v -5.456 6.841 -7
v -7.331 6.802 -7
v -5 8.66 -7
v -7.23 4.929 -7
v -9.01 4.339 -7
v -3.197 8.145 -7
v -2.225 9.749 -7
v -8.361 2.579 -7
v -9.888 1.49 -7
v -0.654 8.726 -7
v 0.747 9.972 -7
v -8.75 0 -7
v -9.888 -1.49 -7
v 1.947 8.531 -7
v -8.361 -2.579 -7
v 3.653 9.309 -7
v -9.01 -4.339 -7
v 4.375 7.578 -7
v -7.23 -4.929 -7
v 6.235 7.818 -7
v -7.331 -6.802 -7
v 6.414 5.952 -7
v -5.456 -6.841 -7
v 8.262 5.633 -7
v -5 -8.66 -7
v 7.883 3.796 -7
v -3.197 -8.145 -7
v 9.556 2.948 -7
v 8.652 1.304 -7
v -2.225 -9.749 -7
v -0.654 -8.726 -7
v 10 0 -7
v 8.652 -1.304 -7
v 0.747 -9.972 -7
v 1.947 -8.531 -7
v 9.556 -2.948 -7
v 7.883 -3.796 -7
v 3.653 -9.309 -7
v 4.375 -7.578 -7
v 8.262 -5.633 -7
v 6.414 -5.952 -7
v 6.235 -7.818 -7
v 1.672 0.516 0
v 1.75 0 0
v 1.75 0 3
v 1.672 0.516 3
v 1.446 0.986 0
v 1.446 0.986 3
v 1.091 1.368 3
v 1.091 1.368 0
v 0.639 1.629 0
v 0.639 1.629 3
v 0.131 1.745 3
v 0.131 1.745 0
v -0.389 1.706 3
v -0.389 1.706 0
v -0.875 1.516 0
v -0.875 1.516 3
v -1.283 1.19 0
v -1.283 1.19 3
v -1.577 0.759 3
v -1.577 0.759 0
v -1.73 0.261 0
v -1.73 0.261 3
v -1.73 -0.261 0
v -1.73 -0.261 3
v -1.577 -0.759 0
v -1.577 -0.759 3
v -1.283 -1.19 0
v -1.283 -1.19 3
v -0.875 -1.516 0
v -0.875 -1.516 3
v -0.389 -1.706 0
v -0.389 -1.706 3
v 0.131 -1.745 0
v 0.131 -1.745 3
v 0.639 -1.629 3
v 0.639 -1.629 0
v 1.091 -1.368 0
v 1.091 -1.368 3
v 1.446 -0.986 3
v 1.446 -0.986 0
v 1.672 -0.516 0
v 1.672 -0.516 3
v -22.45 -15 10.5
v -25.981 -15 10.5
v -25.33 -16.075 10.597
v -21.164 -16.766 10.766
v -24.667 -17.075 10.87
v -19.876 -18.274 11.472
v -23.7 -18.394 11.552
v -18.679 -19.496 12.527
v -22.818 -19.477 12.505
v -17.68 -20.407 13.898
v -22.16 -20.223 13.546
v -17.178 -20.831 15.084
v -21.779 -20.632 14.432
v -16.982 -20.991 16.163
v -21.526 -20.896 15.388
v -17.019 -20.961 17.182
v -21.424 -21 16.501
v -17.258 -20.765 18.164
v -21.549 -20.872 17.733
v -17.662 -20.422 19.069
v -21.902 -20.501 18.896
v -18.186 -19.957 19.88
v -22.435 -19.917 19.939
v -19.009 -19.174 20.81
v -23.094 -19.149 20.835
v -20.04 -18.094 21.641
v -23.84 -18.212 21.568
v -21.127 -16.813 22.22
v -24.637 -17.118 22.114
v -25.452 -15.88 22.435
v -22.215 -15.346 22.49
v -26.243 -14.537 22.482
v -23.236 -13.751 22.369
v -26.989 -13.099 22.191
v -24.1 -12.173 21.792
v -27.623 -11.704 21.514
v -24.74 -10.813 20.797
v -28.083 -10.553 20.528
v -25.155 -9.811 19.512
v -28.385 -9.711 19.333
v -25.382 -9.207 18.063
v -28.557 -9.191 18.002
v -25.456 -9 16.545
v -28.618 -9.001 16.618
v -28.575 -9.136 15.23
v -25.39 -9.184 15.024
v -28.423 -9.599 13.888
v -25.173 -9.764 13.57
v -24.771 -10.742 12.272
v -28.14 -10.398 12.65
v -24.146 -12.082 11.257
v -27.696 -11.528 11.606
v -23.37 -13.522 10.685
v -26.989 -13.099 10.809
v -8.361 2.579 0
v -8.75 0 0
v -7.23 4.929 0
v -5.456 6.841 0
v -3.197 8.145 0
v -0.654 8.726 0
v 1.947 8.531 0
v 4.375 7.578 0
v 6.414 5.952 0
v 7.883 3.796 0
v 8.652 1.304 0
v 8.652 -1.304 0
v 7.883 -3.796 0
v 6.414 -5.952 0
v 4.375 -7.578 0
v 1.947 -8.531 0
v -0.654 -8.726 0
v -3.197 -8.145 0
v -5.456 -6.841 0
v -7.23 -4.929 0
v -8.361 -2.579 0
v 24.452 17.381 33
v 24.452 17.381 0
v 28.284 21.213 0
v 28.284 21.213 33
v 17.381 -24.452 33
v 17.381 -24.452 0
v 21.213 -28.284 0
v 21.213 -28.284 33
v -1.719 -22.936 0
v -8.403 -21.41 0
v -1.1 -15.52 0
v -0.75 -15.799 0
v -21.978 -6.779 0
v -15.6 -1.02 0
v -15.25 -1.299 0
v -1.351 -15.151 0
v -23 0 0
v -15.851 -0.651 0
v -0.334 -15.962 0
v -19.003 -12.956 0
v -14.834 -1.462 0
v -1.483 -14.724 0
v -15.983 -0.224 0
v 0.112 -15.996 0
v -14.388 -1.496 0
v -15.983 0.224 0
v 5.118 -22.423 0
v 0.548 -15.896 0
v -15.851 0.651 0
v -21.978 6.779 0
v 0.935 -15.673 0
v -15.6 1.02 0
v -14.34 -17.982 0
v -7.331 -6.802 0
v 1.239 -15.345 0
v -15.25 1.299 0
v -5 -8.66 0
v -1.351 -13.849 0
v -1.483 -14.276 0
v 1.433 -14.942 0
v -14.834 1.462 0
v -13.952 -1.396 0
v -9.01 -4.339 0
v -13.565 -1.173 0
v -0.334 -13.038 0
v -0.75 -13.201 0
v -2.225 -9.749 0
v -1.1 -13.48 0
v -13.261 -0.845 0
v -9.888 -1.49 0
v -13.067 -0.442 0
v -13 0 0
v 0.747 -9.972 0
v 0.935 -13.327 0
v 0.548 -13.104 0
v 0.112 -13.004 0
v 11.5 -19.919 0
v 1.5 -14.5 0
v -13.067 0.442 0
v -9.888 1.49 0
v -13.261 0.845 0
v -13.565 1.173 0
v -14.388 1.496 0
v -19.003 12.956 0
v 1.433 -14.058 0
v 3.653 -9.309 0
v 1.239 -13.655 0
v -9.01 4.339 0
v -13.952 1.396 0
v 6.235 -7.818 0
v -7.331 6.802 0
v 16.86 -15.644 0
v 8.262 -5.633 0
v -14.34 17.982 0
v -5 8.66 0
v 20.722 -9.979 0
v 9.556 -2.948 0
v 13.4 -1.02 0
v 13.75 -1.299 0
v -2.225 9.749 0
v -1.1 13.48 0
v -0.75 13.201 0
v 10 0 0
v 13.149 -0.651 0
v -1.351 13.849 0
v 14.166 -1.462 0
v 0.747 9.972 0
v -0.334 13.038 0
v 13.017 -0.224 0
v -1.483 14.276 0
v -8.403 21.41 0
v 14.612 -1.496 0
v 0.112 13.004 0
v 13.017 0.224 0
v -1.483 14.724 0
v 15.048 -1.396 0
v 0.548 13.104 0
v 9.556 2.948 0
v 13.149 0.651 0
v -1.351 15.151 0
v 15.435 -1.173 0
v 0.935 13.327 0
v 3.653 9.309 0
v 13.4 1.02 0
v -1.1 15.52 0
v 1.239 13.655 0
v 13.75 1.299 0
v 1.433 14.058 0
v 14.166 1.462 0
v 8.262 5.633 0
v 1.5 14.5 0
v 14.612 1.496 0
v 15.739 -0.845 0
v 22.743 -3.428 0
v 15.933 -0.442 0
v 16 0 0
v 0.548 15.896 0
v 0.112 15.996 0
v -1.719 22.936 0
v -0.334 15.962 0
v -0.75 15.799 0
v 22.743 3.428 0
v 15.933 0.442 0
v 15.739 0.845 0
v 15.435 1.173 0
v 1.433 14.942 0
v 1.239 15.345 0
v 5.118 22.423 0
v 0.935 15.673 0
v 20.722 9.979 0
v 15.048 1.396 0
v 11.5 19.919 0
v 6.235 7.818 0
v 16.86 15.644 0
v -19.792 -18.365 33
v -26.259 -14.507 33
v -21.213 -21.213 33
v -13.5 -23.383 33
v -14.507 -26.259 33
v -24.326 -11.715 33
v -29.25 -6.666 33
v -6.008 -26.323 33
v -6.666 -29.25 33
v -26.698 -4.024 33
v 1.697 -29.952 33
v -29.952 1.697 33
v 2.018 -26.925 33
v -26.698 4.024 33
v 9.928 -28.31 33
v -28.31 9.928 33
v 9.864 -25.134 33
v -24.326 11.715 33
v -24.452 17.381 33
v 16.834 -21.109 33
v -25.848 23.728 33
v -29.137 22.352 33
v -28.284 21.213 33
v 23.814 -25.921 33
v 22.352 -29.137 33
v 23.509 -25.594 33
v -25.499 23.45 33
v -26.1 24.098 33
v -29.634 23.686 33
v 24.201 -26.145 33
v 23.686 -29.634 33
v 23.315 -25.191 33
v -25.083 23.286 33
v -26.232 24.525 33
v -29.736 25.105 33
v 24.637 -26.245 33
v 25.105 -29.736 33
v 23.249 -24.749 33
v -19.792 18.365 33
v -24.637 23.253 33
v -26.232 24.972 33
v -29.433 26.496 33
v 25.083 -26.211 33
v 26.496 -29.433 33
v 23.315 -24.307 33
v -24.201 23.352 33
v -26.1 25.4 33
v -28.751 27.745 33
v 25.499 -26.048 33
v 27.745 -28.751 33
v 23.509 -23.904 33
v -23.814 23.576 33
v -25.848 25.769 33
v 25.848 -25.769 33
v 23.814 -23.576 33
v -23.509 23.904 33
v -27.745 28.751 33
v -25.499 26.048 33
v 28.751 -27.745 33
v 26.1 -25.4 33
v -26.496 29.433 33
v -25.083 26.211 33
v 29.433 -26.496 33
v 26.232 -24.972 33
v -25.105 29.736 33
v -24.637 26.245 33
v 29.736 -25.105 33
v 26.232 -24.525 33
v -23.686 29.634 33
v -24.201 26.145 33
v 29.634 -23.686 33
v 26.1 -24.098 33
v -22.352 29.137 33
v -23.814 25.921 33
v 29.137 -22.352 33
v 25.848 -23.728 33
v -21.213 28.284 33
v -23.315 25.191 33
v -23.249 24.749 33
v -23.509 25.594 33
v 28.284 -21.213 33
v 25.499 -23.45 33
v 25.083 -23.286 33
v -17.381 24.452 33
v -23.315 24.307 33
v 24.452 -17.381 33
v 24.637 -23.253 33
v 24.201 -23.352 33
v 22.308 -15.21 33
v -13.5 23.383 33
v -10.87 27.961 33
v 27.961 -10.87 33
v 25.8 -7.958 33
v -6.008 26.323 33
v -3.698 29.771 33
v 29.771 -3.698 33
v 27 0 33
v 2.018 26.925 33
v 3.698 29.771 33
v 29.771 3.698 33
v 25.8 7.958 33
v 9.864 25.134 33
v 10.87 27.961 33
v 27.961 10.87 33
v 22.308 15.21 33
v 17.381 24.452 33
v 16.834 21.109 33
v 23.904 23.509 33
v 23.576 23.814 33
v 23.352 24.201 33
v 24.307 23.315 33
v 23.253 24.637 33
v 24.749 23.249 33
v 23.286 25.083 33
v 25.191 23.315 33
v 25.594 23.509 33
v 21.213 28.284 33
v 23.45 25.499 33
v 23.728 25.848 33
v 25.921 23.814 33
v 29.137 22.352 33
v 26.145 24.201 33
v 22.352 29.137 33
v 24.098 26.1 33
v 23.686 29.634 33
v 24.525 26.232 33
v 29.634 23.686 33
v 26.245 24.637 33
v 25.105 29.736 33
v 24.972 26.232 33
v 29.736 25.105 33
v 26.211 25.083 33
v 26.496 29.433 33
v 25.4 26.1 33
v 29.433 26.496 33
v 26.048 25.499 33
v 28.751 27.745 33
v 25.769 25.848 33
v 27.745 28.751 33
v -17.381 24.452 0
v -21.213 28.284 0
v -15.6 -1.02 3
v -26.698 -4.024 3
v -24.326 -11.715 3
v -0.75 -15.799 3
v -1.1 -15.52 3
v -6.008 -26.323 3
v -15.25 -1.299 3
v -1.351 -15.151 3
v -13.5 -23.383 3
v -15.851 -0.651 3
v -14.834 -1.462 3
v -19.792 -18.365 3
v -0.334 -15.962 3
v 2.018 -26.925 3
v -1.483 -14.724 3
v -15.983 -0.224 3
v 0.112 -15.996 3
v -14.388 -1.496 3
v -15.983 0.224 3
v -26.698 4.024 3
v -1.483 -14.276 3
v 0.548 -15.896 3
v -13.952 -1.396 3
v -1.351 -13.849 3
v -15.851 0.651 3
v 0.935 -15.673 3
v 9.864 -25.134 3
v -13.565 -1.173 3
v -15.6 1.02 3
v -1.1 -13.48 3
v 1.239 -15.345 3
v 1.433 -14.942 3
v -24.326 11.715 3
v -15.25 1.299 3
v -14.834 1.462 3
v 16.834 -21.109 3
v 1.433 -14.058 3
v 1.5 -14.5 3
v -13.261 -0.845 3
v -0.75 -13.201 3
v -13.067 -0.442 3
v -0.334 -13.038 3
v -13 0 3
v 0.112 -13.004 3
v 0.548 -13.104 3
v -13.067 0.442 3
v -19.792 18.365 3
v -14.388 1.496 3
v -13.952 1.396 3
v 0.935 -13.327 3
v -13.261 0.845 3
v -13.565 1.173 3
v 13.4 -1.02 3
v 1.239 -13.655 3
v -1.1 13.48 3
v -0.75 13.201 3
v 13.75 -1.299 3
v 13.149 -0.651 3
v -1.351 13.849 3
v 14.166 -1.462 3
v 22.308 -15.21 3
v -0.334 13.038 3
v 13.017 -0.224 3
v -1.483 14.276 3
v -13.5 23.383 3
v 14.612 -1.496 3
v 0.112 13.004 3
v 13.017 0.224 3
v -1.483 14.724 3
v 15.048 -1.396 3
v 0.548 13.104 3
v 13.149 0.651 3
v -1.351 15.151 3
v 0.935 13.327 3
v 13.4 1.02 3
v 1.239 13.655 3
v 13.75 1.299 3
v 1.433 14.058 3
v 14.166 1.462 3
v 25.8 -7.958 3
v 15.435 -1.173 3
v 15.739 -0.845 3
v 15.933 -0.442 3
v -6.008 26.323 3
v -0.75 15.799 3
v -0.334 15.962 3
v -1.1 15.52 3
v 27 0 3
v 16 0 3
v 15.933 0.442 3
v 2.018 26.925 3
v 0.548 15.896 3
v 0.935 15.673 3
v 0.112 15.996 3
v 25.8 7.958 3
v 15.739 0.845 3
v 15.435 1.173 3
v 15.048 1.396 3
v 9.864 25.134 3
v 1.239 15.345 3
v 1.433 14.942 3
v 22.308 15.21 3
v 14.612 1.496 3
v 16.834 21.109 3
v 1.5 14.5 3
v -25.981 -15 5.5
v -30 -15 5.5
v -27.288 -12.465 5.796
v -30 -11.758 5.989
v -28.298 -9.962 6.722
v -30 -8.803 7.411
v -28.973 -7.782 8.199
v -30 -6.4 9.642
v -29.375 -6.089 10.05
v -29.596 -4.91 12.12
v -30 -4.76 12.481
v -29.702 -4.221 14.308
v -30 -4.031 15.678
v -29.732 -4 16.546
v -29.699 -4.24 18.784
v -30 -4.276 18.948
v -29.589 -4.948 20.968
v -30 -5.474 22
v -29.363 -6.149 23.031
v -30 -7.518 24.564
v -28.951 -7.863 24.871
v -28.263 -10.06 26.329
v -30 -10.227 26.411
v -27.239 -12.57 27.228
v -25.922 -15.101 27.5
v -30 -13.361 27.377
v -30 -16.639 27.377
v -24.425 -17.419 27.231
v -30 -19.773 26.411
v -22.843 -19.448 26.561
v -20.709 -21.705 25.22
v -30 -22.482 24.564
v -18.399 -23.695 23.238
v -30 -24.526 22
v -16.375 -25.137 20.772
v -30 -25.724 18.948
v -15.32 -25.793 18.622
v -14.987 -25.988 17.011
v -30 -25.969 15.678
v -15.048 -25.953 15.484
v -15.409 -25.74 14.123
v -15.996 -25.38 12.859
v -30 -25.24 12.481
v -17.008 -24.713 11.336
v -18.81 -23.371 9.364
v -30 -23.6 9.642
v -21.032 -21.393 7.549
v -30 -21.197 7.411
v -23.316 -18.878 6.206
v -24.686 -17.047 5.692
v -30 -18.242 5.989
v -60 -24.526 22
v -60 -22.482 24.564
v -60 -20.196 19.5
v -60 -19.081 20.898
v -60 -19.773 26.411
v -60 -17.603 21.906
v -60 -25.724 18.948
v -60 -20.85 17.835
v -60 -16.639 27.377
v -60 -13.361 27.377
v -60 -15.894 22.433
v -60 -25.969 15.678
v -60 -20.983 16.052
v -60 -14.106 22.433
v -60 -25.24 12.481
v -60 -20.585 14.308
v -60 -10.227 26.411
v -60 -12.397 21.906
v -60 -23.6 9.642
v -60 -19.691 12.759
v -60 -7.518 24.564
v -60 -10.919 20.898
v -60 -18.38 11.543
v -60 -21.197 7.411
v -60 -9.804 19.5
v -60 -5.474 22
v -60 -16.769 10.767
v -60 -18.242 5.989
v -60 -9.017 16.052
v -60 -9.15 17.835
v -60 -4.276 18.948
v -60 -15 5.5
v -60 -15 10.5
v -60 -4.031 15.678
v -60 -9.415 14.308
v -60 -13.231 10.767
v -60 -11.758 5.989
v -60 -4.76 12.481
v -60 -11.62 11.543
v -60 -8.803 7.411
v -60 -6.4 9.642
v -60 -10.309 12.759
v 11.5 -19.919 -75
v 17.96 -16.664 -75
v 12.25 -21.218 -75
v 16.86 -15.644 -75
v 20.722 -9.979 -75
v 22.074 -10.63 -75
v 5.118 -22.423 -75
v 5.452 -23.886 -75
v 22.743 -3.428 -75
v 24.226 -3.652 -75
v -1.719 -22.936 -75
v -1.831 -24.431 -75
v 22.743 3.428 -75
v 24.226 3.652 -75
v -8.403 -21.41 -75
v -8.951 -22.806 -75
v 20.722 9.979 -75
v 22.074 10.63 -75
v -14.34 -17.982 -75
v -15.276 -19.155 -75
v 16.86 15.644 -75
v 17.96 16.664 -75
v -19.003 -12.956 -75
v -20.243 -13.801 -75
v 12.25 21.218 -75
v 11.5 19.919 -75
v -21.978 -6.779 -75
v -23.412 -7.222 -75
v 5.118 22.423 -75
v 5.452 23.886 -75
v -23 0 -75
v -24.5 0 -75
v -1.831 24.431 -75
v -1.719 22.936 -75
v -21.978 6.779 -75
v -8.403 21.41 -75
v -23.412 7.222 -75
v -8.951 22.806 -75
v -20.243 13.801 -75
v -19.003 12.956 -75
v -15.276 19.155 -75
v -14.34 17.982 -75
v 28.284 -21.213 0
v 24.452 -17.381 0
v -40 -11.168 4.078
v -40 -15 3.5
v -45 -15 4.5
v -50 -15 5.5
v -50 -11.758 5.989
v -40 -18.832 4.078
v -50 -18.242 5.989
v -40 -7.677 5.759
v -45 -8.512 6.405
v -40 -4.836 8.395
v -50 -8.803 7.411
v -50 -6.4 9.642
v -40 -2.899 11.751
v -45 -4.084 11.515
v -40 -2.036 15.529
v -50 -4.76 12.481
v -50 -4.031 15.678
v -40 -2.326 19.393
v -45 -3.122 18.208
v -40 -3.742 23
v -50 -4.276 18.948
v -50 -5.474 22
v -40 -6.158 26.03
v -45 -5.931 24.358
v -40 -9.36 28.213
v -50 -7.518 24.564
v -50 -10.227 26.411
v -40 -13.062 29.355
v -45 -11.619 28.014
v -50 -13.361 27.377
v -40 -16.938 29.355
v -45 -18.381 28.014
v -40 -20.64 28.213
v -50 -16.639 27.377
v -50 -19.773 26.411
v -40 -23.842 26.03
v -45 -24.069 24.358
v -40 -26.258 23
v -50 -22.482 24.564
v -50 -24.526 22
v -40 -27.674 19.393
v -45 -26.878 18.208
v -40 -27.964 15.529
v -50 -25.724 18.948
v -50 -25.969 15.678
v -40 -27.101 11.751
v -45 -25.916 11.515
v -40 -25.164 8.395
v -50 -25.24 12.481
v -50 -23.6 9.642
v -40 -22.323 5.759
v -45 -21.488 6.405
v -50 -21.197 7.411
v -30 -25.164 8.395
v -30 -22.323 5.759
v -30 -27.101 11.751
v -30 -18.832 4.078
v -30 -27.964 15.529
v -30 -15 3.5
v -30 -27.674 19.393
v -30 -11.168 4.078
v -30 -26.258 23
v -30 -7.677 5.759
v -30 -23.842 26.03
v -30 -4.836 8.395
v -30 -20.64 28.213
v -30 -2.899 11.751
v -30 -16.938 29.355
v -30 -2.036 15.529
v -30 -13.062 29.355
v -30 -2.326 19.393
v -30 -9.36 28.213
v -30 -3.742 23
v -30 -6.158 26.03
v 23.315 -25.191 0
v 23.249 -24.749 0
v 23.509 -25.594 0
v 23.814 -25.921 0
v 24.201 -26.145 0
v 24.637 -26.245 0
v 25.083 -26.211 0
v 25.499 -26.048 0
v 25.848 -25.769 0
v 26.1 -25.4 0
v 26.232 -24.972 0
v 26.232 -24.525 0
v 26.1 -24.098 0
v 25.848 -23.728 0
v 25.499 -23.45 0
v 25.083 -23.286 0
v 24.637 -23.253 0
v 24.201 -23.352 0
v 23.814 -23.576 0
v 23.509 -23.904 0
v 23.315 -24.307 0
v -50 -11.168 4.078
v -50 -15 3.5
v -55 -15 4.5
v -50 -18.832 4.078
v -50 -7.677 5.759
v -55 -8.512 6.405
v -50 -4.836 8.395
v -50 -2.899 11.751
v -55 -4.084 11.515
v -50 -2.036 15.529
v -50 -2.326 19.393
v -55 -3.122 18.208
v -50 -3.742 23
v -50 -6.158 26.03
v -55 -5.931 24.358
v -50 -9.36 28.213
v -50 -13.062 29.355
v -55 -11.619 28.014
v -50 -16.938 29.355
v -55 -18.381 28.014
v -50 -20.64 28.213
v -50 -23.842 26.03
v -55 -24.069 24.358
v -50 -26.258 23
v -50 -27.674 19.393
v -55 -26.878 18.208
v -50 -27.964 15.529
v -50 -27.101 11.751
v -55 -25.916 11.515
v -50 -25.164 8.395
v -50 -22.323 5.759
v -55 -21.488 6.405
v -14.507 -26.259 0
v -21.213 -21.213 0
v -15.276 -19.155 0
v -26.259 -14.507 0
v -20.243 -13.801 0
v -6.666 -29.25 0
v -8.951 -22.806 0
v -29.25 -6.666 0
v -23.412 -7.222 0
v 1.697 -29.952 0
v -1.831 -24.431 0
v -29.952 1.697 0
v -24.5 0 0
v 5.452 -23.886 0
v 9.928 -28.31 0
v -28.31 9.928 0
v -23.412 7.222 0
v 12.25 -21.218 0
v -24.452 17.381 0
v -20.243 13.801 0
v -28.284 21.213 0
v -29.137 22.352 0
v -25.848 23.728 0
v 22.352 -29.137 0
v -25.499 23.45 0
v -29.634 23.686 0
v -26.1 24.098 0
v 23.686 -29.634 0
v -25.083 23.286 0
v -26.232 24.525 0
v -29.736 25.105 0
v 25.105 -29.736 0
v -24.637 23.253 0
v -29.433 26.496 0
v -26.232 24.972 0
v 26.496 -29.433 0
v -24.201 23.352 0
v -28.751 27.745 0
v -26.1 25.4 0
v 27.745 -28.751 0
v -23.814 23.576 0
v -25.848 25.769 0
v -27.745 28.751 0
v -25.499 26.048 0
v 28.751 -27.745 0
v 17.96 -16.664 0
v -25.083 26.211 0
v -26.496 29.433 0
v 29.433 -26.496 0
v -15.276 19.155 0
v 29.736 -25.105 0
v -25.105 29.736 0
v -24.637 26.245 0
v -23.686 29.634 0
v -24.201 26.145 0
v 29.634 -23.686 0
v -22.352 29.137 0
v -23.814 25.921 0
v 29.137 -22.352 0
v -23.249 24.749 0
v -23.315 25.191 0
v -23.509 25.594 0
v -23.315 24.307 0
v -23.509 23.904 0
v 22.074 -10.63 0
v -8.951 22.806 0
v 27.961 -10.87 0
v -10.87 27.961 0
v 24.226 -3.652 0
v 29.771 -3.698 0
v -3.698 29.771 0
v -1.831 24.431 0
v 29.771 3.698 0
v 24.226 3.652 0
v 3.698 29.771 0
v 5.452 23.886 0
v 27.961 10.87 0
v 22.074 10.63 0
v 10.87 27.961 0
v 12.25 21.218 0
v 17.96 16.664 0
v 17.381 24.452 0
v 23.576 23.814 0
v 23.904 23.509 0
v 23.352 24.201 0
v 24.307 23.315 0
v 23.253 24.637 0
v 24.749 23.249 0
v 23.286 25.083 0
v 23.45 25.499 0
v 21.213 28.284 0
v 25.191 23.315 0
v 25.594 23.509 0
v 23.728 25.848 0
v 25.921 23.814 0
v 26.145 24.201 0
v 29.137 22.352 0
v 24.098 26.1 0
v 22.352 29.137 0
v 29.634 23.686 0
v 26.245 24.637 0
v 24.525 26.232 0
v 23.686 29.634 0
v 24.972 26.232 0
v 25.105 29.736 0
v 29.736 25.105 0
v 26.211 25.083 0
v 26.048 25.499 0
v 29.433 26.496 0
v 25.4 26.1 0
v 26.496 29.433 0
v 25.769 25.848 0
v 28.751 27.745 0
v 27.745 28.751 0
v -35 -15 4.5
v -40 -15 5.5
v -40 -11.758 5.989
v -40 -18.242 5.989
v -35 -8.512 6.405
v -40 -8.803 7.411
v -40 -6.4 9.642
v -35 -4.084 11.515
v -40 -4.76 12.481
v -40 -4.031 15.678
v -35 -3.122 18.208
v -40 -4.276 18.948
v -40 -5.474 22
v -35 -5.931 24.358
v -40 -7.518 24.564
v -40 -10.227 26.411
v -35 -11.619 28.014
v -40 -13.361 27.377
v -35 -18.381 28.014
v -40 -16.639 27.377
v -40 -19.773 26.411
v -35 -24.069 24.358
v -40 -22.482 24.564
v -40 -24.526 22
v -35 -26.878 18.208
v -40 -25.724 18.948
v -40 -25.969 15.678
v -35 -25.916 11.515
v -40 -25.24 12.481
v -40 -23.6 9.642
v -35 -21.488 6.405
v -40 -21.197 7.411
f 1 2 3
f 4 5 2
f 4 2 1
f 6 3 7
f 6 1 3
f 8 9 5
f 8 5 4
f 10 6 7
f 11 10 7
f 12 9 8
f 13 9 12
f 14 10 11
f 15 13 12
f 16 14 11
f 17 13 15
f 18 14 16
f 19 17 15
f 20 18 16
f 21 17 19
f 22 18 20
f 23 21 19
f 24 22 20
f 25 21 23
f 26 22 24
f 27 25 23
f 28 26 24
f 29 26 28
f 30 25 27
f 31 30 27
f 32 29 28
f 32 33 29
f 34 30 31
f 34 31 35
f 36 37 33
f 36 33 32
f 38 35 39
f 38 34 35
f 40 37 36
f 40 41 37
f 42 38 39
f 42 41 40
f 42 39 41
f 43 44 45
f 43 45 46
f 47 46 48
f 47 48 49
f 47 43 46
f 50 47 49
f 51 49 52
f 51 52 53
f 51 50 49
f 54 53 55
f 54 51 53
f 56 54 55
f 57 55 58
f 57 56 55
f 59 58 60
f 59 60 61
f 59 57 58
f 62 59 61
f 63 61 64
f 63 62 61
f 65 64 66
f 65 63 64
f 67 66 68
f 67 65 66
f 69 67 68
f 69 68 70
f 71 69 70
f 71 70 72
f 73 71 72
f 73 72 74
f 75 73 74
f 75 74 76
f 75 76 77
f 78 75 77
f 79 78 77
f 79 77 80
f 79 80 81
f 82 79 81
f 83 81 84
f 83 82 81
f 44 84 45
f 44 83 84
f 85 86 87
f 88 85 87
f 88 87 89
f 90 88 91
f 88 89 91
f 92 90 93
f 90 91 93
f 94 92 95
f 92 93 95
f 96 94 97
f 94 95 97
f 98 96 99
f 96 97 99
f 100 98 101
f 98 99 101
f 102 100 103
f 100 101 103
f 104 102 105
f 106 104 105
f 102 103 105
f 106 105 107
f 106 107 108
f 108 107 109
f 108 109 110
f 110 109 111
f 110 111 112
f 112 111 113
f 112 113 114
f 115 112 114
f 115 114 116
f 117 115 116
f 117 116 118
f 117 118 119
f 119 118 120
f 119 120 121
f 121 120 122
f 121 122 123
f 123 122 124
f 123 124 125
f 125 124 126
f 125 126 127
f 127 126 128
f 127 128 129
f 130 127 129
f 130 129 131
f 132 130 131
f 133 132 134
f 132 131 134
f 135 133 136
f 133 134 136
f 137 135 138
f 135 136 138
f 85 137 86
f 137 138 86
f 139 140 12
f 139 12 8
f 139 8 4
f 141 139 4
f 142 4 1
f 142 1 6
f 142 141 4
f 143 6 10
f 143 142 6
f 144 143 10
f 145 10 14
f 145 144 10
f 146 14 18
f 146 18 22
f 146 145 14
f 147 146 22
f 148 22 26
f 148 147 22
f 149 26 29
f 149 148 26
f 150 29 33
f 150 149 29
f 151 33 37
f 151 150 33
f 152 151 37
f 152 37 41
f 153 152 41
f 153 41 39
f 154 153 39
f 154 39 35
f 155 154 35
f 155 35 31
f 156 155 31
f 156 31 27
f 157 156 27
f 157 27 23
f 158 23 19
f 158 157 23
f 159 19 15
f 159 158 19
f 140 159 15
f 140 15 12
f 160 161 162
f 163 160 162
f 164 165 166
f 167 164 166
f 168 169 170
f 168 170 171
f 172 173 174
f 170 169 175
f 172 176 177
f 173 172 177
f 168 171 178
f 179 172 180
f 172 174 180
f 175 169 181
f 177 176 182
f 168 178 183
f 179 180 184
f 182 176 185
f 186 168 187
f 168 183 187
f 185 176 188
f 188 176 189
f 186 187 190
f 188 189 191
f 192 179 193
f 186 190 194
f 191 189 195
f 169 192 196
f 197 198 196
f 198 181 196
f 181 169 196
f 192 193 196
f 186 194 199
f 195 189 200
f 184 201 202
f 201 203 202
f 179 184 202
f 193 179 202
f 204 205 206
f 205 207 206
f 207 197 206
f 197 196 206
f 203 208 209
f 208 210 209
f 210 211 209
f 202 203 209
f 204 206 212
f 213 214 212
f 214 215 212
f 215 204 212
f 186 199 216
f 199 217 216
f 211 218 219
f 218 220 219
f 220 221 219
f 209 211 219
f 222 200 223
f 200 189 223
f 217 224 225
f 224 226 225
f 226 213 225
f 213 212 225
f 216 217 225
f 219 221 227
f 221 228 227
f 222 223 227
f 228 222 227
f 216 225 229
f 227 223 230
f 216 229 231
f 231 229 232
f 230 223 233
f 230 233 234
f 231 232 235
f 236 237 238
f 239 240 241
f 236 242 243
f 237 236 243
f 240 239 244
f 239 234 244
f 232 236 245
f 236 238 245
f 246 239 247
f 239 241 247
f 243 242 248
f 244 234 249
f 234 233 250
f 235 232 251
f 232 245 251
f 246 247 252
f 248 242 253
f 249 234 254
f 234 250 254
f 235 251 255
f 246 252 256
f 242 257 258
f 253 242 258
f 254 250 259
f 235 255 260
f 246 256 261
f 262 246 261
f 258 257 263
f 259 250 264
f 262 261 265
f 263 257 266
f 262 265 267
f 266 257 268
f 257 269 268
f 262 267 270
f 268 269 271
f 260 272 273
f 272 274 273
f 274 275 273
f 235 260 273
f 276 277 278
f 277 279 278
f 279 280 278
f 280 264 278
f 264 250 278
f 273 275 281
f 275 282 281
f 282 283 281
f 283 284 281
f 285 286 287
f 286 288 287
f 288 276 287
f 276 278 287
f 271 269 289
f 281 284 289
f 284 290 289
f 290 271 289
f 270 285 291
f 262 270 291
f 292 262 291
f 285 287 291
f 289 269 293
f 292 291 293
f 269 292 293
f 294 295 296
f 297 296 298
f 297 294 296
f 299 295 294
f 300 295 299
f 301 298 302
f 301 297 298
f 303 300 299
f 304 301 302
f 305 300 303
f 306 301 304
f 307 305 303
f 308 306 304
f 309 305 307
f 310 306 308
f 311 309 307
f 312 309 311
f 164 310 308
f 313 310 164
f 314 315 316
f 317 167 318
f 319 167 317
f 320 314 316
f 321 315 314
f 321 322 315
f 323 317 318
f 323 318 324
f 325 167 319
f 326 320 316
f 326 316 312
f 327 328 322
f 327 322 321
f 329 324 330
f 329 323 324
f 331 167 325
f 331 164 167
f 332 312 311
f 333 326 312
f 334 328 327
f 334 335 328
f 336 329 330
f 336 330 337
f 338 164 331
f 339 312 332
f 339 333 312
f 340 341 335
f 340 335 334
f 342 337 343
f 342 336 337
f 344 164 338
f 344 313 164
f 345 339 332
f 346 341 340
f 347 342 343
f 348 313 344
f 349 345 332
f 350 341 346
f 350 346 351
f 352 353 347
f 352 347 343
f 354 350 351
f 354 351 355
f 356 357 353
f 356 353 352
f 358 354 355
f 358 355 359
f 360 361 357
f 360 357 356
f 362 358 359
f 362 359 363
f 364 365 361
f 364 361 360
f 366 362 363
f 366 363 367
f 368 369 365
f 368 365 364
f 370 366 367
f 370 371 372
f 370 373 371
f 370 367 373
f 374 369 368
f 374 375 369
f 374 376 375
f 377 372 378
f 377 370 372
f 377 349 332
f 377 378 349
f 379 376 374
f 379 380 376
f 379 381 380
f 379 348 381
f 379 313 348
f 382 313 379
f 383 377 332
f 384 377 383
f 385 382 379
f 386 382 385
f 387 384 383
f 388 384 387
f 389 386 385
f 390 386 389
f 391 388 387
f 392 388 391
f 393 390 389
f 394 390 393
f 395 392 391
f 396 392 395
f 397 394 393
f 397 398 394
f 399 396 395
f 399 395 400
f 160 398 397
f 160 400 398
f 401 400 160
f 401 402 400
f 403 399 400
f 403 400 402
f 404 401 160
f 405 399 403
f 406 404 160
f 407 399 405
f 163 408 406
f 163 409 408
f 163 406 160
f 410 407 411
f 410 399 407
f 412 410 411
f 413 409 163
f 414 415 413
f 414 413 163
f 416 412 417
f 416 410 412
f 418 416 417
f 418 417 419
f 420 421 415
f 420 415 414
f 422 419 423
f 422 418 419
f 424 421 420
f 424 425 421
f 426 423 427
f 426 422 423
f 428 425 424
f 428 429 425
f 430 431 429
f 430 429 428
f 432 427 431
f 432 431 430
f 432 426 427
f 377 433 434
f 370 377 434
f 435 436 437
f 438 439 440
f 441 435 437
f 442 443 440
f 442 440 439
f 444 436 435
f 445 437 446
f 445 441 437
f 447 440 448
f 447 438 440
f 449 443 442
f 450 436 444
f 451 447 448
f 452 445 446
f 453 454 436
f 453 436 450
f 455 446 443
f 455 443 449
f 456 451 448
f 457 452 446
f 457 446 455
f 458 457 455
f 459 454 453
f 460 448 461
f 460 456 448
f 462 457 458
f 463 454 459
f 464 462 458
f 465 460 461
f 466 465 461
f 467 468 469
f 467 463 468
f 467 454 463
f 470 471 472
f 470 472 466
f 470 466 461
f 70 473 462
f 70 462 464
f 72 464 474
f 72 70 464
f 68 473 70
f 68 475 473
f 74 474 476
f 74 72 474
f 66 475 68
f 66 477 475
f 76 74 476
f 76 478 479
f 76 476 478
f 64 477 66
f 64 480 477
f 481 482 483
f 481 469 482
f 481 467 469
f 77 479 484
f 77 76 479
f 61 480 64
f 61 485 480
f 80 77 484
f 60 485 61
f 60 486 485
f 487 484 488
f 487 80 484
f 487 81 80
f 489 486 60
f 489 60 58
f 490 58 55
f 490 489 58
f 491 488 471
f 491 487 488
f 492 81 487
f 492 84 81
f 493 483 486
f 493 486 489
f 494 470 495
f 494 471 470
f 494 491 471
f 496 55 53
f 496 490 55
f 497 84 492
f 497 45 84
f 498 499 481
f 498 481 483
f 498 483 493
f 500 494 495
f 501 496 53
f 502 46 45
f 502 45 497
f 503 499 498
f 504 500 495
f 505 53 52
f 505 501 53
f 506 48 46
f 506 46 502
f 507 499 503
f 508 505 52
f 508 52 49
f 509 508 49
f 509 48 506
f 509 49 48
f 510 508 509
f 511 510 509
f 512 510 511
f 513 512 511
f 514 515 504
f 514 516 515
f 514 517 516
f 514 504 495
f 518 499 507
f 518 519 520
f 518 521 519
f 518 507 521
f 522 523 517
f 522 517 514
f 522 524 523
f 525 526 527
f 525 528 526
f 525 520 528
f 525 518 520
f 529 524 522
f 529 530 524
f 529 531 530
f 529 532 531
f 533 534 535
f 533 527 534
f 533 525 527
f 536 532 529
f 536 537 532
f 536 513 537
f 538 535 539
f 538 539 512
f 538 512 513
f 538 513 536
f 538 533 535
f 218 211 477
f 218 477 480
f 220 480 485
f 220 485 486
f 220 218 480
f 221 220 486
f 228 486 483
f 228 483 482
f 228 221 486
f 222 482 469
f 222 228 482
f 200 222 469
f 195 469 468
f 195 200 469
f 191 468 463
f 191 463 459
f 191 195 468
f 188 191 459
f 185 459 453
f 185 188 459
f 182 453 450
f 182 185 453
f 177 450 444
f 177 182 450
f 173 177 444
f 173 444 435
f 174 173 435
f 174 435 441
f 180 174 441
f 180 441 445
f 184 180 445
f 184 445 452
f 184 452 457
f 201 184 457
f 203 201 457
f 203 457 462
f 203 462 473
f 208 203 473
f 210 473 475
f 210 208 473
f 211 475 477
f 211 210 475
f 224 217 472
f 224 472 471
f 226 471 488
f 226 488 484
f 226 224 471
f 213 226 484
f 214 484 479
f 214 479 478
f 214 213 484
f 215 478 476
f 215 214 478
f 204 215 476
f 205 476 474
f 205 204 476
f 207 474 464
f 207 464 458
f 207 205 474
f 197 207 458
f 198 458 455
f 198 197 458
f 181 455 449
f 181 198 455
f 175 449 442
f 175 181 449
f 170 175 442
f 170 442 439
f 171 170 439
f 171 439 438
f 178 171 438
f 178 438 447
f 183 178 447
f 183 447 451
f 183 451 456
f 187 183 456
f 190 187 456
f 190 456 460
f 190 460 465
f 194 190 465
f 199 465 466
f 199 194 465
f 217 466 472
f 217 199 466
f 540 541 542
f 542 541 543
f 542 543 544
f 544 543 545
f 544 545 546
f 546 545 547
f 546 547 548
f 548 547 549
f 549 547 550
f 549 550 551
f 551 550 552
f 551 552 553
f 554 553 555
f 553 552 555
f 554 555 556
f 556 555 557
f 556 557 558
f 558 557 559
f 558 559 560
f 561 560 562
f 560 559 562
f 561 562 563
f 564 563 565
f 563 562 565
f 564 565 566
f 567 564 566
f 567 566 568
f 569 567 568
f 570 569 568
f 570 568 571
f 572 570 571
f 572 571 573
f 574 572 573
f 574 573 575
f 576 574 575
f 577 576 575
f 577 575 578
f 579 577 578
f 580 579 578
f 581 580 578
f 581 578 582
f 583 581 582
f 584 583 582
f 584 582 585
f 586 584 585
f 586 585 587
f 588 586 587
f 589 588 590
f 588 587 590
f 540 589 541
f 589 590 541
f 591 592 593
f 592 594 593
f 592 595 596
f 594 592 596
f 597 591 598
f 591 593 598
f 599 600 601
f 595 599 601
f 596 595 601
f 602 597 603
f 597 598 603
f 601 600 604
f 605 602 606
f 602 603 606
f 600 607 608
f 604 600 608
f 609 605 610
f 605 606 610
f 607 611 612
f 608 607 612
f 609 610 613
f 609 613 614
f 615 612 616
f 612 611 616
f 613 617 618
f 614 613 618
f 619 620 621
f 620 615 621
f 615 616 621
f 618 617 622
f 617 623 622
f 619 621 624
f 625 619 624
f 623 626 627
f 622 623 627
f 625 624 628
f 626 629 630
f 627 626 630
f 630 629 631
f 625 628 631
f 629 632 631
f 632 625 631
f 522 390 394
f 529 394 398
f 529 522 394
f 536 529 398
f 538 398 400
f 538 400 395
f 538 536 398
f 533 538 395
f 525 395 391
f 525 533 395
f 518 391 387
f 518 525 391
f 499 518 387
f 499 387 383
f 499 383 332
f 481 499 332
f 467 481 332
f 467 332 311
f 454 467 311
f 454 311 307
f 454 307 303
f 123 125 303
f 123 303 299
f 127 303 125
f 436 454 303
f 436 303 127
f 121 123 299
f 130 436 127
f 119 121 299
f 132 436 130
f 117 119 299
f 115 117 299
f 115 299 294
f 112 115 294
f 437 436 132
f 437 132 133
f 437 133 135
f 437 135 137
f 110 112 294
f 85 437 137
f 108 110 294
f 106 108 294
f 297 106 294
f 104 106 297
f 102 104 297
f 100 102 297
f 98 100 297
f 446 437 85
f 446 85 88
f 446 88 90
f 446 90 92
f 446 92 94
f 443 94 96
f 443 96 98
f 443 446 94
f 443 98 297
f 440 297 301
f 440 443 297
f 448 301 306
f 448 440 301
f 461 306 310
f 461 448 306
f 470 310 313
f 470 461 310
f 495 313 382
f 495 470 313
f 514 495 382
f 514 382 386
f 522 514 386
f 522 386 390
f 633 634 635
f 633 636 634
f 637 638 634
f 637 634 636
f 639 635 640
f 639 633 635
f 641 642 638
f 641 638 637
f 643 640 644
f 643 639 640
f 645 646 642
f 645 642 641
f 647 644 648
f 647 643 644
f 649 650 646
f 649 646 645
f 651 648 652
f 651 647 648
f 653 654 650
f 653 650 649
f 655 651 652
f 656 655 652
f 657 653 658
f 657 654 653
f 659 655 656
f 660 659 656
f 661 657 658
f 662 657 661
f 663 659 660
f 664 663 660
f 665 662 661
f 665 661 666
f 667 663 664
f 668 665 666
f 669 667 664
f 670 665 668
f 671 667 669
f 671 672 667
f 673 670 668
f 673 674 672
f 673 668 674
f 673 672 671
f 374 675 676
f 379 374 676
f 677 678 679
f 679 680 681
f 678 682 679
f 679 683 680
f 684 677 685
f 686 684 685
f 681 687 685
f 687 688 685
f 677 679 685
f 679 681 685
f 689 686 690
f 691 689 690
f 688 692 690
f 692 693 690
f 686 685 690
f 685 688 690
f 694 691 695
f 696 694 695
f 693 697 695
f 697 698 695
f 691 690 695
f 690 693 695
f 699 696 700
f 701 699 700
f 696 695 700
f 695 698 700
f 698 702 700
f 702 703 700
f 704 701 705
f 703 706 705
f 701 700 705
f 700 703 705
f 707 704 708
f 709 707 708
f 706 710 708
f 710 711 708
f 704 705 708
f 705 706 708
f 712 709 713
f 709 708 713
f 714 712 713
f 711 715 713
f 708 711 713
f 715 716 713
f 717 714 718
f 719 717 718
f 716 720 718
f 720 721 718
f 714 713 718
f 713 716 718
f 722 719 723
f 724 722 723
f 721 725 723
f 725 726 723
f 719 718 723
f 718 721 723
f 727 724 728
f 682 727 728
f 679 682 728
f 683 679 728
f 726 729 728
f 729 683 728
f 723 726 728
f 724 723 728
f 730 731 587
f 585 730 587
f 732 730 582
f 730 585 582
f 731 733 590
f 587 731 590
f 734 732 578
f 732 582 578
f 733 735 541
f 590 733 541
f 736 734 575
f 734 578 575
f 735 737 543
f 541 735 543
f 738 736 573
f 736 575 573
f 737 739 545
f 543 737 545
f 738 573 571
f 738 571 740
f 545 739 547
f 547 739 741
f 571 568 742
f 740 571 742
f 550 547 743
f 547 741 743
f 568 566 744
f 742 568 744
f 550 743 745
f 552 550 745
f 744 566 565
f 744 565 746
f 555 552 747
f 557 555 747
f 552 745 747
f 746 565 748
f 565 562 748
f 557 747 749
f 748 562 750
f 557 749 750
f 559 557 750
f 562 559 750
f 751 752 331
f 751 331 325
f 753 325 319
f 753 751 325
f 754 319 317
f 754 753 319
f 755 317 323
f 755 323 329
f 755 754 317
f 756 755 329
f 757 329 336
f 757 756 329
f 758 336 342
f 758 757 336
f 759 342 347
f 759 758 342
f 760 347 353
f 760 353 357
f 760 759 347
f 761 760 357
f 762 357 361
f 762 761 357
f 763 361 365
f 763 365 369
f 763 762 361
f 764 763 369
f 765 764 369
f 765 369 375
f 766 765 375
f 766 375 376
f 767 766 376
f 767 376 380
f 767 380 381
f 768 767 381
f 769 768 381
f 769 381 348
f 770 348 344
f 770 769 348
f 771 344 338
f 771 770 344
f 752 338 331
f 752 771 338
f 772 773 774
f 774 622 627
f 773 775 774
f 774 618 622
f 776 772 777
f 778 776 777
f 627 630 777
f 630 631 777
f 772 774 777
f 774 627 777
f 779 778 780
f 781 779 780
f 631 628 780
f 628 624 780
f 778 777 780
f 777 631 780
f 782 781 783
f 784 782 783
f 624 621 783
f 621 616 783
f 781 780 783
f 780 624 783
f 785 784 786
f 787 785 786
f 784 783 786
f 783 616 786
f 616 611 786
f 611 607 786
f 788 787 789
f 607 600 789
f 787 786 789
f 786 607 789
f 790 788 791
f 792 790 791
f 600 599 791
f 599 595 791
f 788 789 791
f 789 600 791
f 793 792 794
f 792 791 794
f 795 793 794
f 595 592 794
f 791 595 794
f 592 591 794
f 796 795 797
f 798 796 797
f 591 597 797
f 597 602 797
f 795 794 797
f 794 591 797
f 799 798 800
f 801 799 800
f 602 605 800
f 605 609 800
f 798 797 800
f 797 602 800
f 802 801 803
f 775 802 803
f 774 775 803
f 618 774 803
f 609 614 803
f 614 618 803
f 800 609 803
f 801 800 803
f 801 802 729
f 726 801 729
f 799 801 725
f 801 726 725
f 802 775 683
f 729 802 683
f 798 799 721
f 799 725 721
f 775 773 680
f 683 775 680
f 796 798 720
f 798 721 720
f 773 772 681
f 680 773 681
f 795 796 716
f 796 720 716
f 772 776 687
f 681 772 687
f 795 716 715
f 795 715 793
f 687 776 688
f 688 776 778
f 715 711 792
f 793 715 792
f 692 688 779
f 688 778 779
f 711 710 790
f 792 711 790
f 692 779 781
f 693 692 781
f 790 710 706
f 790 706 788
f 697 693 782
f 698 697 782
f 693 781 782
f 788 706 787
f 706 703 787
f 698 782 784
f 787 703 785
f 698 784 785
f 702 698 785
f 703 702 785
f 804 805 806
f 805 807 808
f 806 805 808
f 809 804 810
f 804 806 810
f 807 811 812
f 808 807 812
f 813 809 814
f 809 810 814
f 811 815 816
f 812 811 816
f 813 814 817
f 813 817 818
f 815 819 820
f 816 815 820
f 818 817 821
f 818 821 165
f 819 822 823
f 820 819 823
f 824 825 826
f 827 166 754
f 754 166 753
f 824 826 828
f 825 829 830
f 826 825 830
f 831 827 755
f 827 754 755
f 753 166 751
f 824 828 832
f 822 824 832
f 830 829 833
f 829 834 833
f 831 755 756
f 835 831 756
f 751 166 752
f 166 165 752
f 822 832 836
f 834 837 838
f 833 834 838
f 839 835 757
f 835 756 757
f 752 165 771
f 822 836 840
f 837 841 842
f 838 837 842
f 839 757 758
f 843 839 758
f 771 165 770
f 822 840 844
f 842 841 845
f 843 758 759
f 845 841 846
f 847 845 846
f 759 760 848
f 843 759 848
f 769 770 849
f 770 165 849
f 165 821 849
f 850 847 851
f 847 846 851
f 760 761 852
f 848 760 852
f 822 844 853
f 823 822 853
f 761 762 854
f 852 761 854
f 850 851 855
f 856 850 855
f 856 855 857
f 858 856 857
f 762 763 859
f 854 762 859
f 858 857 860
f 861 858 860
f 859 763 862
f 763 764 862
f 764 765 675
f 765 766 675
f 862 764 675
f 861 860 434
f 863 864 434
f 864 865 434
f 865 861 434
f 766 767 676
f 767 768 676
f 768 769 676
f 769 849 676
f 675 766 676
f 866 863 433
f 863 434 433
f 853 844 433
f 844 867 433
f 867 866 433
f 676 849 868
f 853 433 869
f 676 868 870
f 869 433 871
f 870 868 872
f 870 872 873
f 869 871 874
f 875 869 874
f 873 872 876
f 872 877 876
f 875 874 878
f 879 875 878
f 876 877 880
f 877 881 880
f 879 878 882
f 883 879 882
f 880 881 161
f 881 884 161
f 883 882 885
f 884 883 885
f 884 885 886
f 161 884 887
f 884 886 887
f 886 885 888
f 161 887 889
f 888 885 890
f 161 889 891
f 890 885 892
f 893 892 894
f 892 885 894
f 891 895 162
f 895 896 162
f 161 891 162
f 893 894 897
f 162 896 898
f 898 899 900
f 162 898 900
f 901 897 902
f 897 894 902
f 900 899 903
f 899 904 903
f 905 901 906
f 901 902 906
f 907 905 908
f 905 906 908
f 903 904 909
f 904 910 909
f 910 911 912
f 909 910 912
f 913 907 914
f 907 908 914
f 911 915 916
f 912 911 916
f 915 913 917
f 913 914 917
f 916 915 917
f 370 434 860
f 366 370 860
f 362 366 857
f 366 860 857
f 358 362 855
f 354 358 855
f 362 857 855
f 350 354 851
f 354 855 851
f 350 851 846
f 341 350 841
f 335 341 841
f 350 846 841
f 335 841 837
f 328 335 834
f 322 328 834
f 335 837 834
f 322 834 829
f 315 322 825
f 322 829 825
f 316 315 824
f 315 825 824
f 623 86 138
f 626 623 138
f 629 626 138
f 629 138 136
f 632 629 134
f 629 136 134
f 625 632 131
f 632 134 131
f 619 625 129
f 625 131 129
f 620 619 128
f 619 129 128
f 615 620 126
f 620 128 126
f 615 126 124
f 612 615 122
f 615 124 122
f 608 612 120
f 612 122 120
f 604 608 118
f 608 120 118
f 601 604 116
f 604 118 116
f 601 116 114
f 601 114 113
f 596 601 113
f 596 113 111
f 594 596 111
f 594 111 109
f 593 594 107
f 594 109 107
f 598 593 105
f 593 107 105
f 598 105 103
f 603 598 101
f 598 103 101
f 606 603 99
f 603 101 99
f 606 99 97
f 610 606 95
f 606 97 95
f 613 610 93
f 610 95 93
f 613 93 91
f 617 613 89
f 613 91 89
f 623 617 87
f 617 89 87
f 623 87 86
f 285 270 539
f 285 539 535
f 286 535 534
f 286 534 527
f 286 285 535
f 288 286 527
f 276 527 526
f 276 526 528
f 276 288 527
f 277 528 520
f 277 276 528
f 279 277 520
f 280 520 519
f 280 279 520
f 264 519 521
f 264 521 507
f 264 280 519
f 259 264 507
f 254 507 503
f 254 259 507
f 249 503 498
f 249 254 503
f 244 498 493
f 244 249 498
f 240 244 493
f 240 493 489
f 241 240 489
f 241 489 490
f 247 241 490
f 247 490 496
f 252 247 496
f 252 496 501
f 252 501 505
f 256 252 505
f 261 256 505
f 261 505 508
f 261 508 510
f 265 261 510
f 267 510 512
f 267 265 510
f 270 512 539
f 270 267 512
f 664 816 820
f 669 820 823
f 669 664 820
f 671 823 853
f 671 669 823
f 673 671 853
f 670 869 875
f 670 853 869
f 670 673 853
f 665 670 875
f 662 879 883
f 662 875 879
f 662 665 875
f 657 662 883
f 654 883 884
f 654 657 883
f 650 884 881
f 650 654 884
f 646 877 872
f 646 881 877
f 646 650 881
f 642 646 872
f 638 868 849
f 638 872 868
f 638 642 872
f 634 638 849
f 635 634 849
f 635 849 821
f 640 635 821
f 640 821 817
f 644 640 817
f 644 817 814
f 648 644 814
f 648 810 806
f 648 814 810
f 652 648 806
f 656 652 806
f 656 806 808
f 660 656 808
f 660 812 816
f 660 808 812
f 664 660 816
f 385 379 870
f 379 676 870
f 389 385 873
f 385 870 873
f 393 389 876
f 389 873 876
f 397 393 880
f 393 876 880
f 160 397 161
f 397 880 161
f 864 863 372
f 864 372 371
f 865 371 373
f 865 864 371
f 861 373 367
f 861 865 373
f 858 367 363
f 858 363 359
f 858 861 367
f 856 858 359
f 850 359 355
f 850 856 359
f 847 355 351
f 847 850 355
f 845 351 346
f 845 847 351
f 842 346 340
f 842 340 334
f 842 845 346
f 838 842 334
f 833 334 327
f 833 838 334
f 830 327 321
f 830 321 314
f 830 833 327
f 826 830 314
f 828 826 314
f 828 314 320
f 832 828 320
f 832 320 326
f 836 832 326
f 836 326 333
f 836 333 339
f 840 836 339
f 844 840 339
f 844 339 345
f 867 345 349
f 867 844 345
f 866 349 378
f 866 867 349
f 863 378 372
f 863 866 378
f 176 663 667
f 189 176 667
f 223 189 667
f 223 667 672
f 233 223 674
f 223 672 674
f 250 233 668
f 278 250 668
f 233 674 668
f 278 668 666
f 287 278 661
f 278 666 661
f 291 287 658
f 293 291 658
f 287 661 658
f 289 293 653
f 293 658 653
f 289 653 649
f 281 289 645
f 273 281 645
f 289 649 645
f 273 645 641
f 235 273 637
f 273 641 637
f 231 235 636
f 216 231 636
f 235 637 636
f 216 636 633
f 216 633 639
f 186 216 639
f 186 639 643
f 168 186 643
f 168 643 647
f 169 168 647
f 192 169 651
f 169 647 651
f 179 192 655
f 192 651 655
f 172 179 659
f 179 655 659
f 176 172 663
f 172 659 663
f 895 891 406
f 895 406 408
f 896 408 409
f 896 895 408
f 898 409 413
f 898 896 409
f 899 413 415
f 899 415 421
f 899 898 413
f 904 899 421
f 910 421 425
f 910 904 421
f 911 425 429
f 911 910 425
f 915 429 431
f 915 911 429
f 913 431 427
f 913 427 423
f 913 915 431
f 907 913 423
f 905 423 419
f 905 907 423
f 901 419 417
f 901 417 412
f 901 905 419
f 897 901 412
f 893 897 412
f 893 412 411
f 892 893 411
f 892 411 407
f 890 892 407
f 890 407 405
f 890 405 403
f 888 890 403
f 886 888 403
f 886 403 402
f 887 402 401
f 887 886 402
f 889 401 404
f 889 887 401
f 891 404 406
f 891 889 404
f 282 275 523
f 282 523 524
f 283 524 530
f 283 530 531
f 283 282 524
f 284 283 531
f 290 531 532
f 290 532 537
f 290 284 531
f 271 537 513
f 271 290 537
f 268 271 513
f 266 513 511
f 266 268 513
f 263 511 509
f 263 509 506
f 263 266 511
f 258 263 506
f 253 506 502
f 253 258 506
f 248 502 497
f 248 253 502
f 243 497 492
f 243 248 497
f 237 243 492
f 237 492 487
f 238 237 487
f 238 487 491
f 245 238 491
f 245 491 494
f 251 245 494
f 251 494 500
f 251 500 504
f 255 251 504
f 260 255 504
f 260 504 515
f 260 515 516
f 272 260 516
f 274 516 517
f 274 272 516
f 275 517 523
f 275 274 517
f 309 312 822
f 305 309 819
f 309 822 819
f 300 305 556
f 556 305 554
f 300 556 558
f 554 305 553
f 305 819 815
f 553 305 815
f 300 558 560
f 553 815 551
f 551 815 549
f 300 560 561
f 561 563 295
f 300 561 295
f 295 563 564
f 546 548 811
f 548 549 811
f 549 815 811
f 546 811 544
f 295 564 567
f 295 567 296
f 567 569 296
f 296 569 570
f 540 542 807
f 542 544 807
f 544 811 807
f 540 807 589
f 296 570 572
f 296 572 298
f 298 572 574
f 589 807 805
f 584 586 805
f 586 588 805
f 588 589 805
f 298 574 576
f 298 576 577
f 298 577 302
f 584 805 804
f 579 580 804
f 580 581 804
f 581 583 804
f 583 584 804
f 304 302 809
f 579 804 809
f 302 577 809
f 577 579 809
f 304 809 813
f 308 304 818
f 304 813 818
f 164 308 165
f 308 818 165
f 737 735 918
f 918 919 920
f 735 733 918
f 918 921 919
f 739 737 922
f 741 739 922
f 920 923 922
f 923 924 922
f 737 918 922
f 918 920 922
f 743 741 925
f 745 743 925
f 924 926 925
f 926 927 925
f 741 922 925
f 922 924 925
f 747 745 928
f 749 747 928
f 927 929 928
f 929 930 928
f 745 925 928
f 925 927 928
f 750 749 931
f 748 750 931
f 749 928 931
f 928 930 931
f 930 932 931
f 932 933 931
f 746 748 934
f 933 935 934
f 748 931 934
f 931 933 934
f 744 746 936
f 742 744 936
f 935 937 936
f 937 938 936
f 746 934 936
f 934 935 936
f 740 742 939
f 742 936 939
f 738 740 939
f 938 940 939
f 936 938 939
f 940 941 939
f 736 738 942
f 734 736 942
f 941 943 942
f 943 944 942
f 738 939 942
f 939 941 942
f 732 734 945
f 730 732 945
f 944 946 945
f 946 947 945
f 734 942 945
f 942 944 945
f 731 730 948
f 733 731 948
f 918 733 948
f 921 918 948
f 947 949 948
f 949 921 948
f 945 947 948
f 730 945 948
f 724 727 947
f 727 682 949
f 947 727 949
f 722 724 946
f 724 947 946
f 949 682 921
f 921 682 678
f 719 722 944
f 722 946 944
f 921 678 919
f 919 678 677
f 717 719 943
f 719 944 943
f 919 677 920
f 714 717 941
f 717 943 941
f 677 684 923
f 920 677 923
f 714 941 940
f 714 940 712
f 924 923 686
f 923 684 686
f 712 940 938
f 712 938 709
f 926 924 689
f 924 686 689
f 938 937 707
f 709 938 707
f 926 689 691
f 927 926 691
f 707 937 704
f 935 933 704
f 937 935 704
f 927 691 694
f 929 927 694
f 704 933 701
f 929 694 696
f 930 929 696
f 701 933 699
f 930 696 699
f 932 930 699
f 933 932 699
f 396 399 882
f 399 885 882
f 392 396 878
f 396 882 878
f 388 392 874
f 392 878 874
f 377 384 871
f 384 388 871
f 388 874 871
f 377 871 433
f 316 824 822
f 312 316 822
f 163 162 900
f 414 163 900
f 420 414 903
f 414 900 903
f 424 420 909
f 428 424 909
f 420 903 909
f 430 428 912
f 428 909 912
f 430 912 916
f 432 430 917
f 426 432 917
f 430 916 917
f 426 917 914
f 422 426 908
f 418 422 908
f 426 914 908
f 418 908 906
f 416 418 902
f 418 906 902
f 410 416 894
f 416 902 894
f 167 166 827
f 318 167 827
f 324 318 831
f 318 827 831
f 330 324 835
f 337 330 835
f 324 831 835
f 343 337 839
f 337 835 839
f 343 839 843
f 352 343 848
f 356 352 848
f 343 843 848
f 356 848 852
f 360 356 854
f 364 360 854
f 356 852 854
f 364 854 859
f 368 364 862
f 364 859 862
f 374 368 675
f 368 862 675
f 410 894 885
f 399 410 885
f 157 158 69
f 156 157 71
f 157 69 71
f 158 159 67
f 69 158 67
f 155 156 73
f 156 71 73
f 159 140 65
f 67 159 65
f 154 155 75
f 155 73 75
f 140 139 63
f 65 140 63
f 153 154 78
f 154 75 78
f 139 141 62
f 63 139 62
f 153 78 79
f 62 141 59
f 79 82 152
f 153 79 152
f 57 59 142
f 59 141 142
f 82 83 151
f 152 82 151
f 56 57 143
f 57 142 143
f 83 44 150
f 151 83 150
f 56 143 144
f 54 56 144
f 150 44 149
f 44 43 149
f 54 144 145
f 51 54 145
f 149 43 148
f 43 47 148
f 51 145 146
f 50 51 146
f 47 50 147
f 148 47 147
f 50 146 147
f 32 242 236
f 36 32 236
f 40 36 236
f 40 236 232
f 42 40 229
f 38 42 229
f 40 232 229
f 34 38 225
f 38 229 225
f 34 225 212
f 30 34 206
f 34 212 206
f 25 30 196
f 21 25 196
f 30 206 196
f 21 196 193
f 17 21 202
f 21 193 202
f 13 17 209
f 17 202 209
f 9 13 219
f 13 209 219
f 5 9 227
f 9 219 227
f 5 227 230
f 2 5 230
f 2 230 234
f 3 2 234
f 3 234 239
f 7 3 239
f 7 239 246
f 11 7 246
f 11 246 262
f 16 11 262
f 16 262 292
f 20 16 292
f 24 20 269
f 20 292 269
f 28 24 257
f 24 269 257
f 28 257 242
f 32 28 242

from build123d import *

# Parameters (mm, degrees)
SKETCH1_R                       = 24.5
SKETCH1_R_2                     = 1.5
SKETCH1_R_3                     = 1.75
BOSS_EXTRUDE1_DEPTH             = 3
SKETCH2_R                       = 10
SKETCH2_R_2                     = 8.75
BOSS_EXTRUDE2_DEPTH             = 7
BOSS_EXTRUDE3_START             = 75
SKETCH3_R                       = 24.5
SKETCH3_R_2                     = 23
BOSS_EXTRUDE3_DEPTH             = 75
BOSS_EXTRUDE4_START             = -3
SKETCH4_R                       = 30
SKETCH4_R_2                     = 24.5
BOSS_EXTRUDE4_DEPTH             = 3
SKETCH5_R                       = 30
SKETCH5_R_2                     = 27
BOSS_EXTRUDE5_DEPTH             = 30
BOSS_EXTRUDE6_REACH             = 108.888
BOSS_EXTRUDE6_END_RADIUS        = 30
SKETCH6_R                       = 11
SKETCH6_R_2                     = 6
BOSS_EXTRUDE6_DIRECTION_2_DEPTH = 20
CUT_EXTRUDE1_REACH              = 122.934
SKETCH9_R                       = 6
SKETCH11_R                      = 1.5
BOSS_EXTRUDE7_DEPTH             = 33
CIRPATTERN1_COUNT               = 3
CIRPATTERN1_ANGLE               = 180


with BuildPart() as part:
    # Sketch1 → Boss-Extrude1 (new body)
    with BuildSketch(Plane.XY):
        Circle(SKETCH1_R)
        with Locations((14.5, 0)):
            Circle(SKETCH1_R_2, mode=Mode.SUBTRACT)
        with Locations((0, -14.5)):
            Circle(SKETCH1_R_2, mode=Mode.SUBTRACT)
        with Locations((-14.5, 0)):
            Circle(SKETCH1_R_2, mode=Mode.SUBTRACT)
        with Locations((0, 14.5)):
            Circle(SKETCH1_R_2, mode=Mode.SUBTRACT)
        Circle(SKETCH1_R_3, mode=Mode.SUBTRACT)
    extrude(amount=BOSS_EXTRUDE1_DEPTH)

    # Sketch2 → Boss-Extrude2 (add)
    with BuildSketch(Plane(origin=(0, 0, 0), x_dir=(-1, 0, 0), z_dir=(0, 0, -1))):
        with Locations(Location((0, 0, 0), (0, 0, 180))):
            Circle(SKETCH2_R)
        Circle(SKETCH2_R_2, mode=Mode.SUBTRACT)
    extrude(amount=BOSS_EXTRUDE2_DEPTH)

    # Sketch3 → Boss-Extrude3 (add)
    with BuildSketch(Plane(origin=(0, 0, 0), x_dir=(-1, 0, 0), z_dir=(0, 0, -1)).offset(BOSS_EXTRUDE3_START)):
        Circle(SKETCH3_R)
        Circle(SKETCH3_R_2, mode=Mode.SUBTRACT)
    extrude(amount=-BOSS_EXTRUDE3_DEPTH)

    # Sketch4 → Boss-Extrude4 (add)
    with BuildSketch(Plane.XY.offset(3).offset(BOSS_EXTRUDE4_START)):
        Circle(SKETCH4_R)
        with Locations(Location((0, 0, 0), (0, 0, 180))):
            Circle(SKETCH4_R_2, mode=Mode.SUBTRACT)
    extrude(amount=BOSS_EXTRUDE4_DEPTH)

    # Sketch5 → Boss-Extrude5 (add)
    with BuildSketch(Plane.XY.offset(3)):
        Circle(SKETCH5_R)
        Circle(SKETCH5_R_2, mode=Mode.SUBTRACT)
    extrude(amount=BOSS_EXTRUDE5_DEPTH)

    # Boss-Extrude6: up to this cylinder (the profile starts outside it)
    boss_extrude6_end = Plane(origin=(0, 0, 27.188873), z_dir=(0, 0, 1)) * Cylinder(BOSS_EXTRUDE6_END_RADIUS, 278.776, mode=Mode.PRIVATE)
    # Sketch6 → Boss-Extrude6 (add, up to the surface)
    with BuildSketch(Plane(origin=(-40, 0, 0), x_dir=(0, 0, -1), z_dir=(1, 0, 0)), mode=Mode.PRIVATE) as boss_extrude6_sk1:
        with Locations((-16.5, -15)):
            Circle(SKETCH6_R)
        with Locations((-16.5, -15)):
            Circle(SKETCH6_R_2, mode=Mode.SUBTRACT)
    boss_extrude6_tool1 = extrude(boss_extrude6_sk1.sketch, amount=BOSS_EXTRUDE6_REACH, mode=Mode.PRIVATE) - boss_extrude6_end
    add(boss_extrude6_tool1.solids().sort_by_distance((-40, -15, 27.188873))[0])

    # Sketch6 → Boss-Extrude6 direction 2 (add)
    with BuildSketch(Plane(origin=(-40, 0, 0), x_dir=(0, 0, -1), z_dir=(1, 0, 0))):
        with Locations((-16.5, -15)):
            Circle(SKETCH6_R)
        with Locations((-16.5, -15)):
            Circle(SKETCH6_R_2, mode=Mode.SUBTRACT)
    extrude(amount=-BOSS_EXTRUDE6_DIRECTION_2_DEPTH)

    # Sketch8 → Revolve2 (revolve)
    with BuildSketch(Plane.XY.offset(16.5), mode=Mode.PRIVATE) as revolve2_sk:
        Polygon((-50, -4), (-50, -2), (-60, -4), align=None)
        Polygon((-50, -4), (-40, -4), (-40, -2), align=None)
        Polygon((-40, -4), (-30, -4), (-30, -2), align=None)
    revolve(revolve2_sk.sketch.rotate(Axis((-60, -15, 16.5), (1, 0, 0)), 270), axis=Axis((-60, -15, 16.5), (1, 0, 0)))

    # Sketch9 → Cut-Extrude1 (cut, up to next)
    with BuildSketch(Plane.ZY.offset(60), mode=Mode.PRIVATE) as cut_extrude1_sk1:
        with Locations(Location((16.5, -15, 0), (0, 0, 180))):
            Circle(SKETCH9_R)
    cut_extrude1_tool1 = extrude(cut_extrude1_sk1.sketch, amount=-CUT_EXTRUDE1_REACH, mode=Mode.PRIVATE) & part.part
    add(cut_extrude1_tool1.solids().sort_by_distance((-60, -15, 16.5))[0], mode=Mode.SUBTRACT)

    # Sketch11 → Boss-Extrude7 (add)
    with BuildSketch(Plane.XY):
        with BuildLine():
            Line((-28.284271247, 21.213203436), (-24.452034569, 17.380966757))
            ThreePointArc((-24.452034569, 17.380966757), (-21.213203436, 21.213203436), (-17.380966757, 24.452034569))
            Line((-17.380966757, 24.452034569), (-21.213203436, 28.284271247))
            ThreePointArc((-21.213203436, 28.284271247), (-28.284271247, 28.284271247), (-28.284271247, 21.213203436))
        make_face()
        with Locations((-24.748737342, 24.748737342)):
            Circle(SKETCH11_R, mode=Mode.SUBTRACT)
    boss_extrude7 = extrude(amount=BOSS_EXTRUDE7_DEPTH)

    # CirPattern1: Boss-Extrude7 ×3 about axis
    cirpattern1_axis = Axis((0, 0, 0), (0, 0, -1))
    for i in range(1, CIRPATTERN1_COUNT):
        add(boss_extrude7.rotate(cirpattern1_axis, i * CIRPATTERN1_ANGLE / (CIRPATTERN1_COUNT - 1)))


solid = part.part
